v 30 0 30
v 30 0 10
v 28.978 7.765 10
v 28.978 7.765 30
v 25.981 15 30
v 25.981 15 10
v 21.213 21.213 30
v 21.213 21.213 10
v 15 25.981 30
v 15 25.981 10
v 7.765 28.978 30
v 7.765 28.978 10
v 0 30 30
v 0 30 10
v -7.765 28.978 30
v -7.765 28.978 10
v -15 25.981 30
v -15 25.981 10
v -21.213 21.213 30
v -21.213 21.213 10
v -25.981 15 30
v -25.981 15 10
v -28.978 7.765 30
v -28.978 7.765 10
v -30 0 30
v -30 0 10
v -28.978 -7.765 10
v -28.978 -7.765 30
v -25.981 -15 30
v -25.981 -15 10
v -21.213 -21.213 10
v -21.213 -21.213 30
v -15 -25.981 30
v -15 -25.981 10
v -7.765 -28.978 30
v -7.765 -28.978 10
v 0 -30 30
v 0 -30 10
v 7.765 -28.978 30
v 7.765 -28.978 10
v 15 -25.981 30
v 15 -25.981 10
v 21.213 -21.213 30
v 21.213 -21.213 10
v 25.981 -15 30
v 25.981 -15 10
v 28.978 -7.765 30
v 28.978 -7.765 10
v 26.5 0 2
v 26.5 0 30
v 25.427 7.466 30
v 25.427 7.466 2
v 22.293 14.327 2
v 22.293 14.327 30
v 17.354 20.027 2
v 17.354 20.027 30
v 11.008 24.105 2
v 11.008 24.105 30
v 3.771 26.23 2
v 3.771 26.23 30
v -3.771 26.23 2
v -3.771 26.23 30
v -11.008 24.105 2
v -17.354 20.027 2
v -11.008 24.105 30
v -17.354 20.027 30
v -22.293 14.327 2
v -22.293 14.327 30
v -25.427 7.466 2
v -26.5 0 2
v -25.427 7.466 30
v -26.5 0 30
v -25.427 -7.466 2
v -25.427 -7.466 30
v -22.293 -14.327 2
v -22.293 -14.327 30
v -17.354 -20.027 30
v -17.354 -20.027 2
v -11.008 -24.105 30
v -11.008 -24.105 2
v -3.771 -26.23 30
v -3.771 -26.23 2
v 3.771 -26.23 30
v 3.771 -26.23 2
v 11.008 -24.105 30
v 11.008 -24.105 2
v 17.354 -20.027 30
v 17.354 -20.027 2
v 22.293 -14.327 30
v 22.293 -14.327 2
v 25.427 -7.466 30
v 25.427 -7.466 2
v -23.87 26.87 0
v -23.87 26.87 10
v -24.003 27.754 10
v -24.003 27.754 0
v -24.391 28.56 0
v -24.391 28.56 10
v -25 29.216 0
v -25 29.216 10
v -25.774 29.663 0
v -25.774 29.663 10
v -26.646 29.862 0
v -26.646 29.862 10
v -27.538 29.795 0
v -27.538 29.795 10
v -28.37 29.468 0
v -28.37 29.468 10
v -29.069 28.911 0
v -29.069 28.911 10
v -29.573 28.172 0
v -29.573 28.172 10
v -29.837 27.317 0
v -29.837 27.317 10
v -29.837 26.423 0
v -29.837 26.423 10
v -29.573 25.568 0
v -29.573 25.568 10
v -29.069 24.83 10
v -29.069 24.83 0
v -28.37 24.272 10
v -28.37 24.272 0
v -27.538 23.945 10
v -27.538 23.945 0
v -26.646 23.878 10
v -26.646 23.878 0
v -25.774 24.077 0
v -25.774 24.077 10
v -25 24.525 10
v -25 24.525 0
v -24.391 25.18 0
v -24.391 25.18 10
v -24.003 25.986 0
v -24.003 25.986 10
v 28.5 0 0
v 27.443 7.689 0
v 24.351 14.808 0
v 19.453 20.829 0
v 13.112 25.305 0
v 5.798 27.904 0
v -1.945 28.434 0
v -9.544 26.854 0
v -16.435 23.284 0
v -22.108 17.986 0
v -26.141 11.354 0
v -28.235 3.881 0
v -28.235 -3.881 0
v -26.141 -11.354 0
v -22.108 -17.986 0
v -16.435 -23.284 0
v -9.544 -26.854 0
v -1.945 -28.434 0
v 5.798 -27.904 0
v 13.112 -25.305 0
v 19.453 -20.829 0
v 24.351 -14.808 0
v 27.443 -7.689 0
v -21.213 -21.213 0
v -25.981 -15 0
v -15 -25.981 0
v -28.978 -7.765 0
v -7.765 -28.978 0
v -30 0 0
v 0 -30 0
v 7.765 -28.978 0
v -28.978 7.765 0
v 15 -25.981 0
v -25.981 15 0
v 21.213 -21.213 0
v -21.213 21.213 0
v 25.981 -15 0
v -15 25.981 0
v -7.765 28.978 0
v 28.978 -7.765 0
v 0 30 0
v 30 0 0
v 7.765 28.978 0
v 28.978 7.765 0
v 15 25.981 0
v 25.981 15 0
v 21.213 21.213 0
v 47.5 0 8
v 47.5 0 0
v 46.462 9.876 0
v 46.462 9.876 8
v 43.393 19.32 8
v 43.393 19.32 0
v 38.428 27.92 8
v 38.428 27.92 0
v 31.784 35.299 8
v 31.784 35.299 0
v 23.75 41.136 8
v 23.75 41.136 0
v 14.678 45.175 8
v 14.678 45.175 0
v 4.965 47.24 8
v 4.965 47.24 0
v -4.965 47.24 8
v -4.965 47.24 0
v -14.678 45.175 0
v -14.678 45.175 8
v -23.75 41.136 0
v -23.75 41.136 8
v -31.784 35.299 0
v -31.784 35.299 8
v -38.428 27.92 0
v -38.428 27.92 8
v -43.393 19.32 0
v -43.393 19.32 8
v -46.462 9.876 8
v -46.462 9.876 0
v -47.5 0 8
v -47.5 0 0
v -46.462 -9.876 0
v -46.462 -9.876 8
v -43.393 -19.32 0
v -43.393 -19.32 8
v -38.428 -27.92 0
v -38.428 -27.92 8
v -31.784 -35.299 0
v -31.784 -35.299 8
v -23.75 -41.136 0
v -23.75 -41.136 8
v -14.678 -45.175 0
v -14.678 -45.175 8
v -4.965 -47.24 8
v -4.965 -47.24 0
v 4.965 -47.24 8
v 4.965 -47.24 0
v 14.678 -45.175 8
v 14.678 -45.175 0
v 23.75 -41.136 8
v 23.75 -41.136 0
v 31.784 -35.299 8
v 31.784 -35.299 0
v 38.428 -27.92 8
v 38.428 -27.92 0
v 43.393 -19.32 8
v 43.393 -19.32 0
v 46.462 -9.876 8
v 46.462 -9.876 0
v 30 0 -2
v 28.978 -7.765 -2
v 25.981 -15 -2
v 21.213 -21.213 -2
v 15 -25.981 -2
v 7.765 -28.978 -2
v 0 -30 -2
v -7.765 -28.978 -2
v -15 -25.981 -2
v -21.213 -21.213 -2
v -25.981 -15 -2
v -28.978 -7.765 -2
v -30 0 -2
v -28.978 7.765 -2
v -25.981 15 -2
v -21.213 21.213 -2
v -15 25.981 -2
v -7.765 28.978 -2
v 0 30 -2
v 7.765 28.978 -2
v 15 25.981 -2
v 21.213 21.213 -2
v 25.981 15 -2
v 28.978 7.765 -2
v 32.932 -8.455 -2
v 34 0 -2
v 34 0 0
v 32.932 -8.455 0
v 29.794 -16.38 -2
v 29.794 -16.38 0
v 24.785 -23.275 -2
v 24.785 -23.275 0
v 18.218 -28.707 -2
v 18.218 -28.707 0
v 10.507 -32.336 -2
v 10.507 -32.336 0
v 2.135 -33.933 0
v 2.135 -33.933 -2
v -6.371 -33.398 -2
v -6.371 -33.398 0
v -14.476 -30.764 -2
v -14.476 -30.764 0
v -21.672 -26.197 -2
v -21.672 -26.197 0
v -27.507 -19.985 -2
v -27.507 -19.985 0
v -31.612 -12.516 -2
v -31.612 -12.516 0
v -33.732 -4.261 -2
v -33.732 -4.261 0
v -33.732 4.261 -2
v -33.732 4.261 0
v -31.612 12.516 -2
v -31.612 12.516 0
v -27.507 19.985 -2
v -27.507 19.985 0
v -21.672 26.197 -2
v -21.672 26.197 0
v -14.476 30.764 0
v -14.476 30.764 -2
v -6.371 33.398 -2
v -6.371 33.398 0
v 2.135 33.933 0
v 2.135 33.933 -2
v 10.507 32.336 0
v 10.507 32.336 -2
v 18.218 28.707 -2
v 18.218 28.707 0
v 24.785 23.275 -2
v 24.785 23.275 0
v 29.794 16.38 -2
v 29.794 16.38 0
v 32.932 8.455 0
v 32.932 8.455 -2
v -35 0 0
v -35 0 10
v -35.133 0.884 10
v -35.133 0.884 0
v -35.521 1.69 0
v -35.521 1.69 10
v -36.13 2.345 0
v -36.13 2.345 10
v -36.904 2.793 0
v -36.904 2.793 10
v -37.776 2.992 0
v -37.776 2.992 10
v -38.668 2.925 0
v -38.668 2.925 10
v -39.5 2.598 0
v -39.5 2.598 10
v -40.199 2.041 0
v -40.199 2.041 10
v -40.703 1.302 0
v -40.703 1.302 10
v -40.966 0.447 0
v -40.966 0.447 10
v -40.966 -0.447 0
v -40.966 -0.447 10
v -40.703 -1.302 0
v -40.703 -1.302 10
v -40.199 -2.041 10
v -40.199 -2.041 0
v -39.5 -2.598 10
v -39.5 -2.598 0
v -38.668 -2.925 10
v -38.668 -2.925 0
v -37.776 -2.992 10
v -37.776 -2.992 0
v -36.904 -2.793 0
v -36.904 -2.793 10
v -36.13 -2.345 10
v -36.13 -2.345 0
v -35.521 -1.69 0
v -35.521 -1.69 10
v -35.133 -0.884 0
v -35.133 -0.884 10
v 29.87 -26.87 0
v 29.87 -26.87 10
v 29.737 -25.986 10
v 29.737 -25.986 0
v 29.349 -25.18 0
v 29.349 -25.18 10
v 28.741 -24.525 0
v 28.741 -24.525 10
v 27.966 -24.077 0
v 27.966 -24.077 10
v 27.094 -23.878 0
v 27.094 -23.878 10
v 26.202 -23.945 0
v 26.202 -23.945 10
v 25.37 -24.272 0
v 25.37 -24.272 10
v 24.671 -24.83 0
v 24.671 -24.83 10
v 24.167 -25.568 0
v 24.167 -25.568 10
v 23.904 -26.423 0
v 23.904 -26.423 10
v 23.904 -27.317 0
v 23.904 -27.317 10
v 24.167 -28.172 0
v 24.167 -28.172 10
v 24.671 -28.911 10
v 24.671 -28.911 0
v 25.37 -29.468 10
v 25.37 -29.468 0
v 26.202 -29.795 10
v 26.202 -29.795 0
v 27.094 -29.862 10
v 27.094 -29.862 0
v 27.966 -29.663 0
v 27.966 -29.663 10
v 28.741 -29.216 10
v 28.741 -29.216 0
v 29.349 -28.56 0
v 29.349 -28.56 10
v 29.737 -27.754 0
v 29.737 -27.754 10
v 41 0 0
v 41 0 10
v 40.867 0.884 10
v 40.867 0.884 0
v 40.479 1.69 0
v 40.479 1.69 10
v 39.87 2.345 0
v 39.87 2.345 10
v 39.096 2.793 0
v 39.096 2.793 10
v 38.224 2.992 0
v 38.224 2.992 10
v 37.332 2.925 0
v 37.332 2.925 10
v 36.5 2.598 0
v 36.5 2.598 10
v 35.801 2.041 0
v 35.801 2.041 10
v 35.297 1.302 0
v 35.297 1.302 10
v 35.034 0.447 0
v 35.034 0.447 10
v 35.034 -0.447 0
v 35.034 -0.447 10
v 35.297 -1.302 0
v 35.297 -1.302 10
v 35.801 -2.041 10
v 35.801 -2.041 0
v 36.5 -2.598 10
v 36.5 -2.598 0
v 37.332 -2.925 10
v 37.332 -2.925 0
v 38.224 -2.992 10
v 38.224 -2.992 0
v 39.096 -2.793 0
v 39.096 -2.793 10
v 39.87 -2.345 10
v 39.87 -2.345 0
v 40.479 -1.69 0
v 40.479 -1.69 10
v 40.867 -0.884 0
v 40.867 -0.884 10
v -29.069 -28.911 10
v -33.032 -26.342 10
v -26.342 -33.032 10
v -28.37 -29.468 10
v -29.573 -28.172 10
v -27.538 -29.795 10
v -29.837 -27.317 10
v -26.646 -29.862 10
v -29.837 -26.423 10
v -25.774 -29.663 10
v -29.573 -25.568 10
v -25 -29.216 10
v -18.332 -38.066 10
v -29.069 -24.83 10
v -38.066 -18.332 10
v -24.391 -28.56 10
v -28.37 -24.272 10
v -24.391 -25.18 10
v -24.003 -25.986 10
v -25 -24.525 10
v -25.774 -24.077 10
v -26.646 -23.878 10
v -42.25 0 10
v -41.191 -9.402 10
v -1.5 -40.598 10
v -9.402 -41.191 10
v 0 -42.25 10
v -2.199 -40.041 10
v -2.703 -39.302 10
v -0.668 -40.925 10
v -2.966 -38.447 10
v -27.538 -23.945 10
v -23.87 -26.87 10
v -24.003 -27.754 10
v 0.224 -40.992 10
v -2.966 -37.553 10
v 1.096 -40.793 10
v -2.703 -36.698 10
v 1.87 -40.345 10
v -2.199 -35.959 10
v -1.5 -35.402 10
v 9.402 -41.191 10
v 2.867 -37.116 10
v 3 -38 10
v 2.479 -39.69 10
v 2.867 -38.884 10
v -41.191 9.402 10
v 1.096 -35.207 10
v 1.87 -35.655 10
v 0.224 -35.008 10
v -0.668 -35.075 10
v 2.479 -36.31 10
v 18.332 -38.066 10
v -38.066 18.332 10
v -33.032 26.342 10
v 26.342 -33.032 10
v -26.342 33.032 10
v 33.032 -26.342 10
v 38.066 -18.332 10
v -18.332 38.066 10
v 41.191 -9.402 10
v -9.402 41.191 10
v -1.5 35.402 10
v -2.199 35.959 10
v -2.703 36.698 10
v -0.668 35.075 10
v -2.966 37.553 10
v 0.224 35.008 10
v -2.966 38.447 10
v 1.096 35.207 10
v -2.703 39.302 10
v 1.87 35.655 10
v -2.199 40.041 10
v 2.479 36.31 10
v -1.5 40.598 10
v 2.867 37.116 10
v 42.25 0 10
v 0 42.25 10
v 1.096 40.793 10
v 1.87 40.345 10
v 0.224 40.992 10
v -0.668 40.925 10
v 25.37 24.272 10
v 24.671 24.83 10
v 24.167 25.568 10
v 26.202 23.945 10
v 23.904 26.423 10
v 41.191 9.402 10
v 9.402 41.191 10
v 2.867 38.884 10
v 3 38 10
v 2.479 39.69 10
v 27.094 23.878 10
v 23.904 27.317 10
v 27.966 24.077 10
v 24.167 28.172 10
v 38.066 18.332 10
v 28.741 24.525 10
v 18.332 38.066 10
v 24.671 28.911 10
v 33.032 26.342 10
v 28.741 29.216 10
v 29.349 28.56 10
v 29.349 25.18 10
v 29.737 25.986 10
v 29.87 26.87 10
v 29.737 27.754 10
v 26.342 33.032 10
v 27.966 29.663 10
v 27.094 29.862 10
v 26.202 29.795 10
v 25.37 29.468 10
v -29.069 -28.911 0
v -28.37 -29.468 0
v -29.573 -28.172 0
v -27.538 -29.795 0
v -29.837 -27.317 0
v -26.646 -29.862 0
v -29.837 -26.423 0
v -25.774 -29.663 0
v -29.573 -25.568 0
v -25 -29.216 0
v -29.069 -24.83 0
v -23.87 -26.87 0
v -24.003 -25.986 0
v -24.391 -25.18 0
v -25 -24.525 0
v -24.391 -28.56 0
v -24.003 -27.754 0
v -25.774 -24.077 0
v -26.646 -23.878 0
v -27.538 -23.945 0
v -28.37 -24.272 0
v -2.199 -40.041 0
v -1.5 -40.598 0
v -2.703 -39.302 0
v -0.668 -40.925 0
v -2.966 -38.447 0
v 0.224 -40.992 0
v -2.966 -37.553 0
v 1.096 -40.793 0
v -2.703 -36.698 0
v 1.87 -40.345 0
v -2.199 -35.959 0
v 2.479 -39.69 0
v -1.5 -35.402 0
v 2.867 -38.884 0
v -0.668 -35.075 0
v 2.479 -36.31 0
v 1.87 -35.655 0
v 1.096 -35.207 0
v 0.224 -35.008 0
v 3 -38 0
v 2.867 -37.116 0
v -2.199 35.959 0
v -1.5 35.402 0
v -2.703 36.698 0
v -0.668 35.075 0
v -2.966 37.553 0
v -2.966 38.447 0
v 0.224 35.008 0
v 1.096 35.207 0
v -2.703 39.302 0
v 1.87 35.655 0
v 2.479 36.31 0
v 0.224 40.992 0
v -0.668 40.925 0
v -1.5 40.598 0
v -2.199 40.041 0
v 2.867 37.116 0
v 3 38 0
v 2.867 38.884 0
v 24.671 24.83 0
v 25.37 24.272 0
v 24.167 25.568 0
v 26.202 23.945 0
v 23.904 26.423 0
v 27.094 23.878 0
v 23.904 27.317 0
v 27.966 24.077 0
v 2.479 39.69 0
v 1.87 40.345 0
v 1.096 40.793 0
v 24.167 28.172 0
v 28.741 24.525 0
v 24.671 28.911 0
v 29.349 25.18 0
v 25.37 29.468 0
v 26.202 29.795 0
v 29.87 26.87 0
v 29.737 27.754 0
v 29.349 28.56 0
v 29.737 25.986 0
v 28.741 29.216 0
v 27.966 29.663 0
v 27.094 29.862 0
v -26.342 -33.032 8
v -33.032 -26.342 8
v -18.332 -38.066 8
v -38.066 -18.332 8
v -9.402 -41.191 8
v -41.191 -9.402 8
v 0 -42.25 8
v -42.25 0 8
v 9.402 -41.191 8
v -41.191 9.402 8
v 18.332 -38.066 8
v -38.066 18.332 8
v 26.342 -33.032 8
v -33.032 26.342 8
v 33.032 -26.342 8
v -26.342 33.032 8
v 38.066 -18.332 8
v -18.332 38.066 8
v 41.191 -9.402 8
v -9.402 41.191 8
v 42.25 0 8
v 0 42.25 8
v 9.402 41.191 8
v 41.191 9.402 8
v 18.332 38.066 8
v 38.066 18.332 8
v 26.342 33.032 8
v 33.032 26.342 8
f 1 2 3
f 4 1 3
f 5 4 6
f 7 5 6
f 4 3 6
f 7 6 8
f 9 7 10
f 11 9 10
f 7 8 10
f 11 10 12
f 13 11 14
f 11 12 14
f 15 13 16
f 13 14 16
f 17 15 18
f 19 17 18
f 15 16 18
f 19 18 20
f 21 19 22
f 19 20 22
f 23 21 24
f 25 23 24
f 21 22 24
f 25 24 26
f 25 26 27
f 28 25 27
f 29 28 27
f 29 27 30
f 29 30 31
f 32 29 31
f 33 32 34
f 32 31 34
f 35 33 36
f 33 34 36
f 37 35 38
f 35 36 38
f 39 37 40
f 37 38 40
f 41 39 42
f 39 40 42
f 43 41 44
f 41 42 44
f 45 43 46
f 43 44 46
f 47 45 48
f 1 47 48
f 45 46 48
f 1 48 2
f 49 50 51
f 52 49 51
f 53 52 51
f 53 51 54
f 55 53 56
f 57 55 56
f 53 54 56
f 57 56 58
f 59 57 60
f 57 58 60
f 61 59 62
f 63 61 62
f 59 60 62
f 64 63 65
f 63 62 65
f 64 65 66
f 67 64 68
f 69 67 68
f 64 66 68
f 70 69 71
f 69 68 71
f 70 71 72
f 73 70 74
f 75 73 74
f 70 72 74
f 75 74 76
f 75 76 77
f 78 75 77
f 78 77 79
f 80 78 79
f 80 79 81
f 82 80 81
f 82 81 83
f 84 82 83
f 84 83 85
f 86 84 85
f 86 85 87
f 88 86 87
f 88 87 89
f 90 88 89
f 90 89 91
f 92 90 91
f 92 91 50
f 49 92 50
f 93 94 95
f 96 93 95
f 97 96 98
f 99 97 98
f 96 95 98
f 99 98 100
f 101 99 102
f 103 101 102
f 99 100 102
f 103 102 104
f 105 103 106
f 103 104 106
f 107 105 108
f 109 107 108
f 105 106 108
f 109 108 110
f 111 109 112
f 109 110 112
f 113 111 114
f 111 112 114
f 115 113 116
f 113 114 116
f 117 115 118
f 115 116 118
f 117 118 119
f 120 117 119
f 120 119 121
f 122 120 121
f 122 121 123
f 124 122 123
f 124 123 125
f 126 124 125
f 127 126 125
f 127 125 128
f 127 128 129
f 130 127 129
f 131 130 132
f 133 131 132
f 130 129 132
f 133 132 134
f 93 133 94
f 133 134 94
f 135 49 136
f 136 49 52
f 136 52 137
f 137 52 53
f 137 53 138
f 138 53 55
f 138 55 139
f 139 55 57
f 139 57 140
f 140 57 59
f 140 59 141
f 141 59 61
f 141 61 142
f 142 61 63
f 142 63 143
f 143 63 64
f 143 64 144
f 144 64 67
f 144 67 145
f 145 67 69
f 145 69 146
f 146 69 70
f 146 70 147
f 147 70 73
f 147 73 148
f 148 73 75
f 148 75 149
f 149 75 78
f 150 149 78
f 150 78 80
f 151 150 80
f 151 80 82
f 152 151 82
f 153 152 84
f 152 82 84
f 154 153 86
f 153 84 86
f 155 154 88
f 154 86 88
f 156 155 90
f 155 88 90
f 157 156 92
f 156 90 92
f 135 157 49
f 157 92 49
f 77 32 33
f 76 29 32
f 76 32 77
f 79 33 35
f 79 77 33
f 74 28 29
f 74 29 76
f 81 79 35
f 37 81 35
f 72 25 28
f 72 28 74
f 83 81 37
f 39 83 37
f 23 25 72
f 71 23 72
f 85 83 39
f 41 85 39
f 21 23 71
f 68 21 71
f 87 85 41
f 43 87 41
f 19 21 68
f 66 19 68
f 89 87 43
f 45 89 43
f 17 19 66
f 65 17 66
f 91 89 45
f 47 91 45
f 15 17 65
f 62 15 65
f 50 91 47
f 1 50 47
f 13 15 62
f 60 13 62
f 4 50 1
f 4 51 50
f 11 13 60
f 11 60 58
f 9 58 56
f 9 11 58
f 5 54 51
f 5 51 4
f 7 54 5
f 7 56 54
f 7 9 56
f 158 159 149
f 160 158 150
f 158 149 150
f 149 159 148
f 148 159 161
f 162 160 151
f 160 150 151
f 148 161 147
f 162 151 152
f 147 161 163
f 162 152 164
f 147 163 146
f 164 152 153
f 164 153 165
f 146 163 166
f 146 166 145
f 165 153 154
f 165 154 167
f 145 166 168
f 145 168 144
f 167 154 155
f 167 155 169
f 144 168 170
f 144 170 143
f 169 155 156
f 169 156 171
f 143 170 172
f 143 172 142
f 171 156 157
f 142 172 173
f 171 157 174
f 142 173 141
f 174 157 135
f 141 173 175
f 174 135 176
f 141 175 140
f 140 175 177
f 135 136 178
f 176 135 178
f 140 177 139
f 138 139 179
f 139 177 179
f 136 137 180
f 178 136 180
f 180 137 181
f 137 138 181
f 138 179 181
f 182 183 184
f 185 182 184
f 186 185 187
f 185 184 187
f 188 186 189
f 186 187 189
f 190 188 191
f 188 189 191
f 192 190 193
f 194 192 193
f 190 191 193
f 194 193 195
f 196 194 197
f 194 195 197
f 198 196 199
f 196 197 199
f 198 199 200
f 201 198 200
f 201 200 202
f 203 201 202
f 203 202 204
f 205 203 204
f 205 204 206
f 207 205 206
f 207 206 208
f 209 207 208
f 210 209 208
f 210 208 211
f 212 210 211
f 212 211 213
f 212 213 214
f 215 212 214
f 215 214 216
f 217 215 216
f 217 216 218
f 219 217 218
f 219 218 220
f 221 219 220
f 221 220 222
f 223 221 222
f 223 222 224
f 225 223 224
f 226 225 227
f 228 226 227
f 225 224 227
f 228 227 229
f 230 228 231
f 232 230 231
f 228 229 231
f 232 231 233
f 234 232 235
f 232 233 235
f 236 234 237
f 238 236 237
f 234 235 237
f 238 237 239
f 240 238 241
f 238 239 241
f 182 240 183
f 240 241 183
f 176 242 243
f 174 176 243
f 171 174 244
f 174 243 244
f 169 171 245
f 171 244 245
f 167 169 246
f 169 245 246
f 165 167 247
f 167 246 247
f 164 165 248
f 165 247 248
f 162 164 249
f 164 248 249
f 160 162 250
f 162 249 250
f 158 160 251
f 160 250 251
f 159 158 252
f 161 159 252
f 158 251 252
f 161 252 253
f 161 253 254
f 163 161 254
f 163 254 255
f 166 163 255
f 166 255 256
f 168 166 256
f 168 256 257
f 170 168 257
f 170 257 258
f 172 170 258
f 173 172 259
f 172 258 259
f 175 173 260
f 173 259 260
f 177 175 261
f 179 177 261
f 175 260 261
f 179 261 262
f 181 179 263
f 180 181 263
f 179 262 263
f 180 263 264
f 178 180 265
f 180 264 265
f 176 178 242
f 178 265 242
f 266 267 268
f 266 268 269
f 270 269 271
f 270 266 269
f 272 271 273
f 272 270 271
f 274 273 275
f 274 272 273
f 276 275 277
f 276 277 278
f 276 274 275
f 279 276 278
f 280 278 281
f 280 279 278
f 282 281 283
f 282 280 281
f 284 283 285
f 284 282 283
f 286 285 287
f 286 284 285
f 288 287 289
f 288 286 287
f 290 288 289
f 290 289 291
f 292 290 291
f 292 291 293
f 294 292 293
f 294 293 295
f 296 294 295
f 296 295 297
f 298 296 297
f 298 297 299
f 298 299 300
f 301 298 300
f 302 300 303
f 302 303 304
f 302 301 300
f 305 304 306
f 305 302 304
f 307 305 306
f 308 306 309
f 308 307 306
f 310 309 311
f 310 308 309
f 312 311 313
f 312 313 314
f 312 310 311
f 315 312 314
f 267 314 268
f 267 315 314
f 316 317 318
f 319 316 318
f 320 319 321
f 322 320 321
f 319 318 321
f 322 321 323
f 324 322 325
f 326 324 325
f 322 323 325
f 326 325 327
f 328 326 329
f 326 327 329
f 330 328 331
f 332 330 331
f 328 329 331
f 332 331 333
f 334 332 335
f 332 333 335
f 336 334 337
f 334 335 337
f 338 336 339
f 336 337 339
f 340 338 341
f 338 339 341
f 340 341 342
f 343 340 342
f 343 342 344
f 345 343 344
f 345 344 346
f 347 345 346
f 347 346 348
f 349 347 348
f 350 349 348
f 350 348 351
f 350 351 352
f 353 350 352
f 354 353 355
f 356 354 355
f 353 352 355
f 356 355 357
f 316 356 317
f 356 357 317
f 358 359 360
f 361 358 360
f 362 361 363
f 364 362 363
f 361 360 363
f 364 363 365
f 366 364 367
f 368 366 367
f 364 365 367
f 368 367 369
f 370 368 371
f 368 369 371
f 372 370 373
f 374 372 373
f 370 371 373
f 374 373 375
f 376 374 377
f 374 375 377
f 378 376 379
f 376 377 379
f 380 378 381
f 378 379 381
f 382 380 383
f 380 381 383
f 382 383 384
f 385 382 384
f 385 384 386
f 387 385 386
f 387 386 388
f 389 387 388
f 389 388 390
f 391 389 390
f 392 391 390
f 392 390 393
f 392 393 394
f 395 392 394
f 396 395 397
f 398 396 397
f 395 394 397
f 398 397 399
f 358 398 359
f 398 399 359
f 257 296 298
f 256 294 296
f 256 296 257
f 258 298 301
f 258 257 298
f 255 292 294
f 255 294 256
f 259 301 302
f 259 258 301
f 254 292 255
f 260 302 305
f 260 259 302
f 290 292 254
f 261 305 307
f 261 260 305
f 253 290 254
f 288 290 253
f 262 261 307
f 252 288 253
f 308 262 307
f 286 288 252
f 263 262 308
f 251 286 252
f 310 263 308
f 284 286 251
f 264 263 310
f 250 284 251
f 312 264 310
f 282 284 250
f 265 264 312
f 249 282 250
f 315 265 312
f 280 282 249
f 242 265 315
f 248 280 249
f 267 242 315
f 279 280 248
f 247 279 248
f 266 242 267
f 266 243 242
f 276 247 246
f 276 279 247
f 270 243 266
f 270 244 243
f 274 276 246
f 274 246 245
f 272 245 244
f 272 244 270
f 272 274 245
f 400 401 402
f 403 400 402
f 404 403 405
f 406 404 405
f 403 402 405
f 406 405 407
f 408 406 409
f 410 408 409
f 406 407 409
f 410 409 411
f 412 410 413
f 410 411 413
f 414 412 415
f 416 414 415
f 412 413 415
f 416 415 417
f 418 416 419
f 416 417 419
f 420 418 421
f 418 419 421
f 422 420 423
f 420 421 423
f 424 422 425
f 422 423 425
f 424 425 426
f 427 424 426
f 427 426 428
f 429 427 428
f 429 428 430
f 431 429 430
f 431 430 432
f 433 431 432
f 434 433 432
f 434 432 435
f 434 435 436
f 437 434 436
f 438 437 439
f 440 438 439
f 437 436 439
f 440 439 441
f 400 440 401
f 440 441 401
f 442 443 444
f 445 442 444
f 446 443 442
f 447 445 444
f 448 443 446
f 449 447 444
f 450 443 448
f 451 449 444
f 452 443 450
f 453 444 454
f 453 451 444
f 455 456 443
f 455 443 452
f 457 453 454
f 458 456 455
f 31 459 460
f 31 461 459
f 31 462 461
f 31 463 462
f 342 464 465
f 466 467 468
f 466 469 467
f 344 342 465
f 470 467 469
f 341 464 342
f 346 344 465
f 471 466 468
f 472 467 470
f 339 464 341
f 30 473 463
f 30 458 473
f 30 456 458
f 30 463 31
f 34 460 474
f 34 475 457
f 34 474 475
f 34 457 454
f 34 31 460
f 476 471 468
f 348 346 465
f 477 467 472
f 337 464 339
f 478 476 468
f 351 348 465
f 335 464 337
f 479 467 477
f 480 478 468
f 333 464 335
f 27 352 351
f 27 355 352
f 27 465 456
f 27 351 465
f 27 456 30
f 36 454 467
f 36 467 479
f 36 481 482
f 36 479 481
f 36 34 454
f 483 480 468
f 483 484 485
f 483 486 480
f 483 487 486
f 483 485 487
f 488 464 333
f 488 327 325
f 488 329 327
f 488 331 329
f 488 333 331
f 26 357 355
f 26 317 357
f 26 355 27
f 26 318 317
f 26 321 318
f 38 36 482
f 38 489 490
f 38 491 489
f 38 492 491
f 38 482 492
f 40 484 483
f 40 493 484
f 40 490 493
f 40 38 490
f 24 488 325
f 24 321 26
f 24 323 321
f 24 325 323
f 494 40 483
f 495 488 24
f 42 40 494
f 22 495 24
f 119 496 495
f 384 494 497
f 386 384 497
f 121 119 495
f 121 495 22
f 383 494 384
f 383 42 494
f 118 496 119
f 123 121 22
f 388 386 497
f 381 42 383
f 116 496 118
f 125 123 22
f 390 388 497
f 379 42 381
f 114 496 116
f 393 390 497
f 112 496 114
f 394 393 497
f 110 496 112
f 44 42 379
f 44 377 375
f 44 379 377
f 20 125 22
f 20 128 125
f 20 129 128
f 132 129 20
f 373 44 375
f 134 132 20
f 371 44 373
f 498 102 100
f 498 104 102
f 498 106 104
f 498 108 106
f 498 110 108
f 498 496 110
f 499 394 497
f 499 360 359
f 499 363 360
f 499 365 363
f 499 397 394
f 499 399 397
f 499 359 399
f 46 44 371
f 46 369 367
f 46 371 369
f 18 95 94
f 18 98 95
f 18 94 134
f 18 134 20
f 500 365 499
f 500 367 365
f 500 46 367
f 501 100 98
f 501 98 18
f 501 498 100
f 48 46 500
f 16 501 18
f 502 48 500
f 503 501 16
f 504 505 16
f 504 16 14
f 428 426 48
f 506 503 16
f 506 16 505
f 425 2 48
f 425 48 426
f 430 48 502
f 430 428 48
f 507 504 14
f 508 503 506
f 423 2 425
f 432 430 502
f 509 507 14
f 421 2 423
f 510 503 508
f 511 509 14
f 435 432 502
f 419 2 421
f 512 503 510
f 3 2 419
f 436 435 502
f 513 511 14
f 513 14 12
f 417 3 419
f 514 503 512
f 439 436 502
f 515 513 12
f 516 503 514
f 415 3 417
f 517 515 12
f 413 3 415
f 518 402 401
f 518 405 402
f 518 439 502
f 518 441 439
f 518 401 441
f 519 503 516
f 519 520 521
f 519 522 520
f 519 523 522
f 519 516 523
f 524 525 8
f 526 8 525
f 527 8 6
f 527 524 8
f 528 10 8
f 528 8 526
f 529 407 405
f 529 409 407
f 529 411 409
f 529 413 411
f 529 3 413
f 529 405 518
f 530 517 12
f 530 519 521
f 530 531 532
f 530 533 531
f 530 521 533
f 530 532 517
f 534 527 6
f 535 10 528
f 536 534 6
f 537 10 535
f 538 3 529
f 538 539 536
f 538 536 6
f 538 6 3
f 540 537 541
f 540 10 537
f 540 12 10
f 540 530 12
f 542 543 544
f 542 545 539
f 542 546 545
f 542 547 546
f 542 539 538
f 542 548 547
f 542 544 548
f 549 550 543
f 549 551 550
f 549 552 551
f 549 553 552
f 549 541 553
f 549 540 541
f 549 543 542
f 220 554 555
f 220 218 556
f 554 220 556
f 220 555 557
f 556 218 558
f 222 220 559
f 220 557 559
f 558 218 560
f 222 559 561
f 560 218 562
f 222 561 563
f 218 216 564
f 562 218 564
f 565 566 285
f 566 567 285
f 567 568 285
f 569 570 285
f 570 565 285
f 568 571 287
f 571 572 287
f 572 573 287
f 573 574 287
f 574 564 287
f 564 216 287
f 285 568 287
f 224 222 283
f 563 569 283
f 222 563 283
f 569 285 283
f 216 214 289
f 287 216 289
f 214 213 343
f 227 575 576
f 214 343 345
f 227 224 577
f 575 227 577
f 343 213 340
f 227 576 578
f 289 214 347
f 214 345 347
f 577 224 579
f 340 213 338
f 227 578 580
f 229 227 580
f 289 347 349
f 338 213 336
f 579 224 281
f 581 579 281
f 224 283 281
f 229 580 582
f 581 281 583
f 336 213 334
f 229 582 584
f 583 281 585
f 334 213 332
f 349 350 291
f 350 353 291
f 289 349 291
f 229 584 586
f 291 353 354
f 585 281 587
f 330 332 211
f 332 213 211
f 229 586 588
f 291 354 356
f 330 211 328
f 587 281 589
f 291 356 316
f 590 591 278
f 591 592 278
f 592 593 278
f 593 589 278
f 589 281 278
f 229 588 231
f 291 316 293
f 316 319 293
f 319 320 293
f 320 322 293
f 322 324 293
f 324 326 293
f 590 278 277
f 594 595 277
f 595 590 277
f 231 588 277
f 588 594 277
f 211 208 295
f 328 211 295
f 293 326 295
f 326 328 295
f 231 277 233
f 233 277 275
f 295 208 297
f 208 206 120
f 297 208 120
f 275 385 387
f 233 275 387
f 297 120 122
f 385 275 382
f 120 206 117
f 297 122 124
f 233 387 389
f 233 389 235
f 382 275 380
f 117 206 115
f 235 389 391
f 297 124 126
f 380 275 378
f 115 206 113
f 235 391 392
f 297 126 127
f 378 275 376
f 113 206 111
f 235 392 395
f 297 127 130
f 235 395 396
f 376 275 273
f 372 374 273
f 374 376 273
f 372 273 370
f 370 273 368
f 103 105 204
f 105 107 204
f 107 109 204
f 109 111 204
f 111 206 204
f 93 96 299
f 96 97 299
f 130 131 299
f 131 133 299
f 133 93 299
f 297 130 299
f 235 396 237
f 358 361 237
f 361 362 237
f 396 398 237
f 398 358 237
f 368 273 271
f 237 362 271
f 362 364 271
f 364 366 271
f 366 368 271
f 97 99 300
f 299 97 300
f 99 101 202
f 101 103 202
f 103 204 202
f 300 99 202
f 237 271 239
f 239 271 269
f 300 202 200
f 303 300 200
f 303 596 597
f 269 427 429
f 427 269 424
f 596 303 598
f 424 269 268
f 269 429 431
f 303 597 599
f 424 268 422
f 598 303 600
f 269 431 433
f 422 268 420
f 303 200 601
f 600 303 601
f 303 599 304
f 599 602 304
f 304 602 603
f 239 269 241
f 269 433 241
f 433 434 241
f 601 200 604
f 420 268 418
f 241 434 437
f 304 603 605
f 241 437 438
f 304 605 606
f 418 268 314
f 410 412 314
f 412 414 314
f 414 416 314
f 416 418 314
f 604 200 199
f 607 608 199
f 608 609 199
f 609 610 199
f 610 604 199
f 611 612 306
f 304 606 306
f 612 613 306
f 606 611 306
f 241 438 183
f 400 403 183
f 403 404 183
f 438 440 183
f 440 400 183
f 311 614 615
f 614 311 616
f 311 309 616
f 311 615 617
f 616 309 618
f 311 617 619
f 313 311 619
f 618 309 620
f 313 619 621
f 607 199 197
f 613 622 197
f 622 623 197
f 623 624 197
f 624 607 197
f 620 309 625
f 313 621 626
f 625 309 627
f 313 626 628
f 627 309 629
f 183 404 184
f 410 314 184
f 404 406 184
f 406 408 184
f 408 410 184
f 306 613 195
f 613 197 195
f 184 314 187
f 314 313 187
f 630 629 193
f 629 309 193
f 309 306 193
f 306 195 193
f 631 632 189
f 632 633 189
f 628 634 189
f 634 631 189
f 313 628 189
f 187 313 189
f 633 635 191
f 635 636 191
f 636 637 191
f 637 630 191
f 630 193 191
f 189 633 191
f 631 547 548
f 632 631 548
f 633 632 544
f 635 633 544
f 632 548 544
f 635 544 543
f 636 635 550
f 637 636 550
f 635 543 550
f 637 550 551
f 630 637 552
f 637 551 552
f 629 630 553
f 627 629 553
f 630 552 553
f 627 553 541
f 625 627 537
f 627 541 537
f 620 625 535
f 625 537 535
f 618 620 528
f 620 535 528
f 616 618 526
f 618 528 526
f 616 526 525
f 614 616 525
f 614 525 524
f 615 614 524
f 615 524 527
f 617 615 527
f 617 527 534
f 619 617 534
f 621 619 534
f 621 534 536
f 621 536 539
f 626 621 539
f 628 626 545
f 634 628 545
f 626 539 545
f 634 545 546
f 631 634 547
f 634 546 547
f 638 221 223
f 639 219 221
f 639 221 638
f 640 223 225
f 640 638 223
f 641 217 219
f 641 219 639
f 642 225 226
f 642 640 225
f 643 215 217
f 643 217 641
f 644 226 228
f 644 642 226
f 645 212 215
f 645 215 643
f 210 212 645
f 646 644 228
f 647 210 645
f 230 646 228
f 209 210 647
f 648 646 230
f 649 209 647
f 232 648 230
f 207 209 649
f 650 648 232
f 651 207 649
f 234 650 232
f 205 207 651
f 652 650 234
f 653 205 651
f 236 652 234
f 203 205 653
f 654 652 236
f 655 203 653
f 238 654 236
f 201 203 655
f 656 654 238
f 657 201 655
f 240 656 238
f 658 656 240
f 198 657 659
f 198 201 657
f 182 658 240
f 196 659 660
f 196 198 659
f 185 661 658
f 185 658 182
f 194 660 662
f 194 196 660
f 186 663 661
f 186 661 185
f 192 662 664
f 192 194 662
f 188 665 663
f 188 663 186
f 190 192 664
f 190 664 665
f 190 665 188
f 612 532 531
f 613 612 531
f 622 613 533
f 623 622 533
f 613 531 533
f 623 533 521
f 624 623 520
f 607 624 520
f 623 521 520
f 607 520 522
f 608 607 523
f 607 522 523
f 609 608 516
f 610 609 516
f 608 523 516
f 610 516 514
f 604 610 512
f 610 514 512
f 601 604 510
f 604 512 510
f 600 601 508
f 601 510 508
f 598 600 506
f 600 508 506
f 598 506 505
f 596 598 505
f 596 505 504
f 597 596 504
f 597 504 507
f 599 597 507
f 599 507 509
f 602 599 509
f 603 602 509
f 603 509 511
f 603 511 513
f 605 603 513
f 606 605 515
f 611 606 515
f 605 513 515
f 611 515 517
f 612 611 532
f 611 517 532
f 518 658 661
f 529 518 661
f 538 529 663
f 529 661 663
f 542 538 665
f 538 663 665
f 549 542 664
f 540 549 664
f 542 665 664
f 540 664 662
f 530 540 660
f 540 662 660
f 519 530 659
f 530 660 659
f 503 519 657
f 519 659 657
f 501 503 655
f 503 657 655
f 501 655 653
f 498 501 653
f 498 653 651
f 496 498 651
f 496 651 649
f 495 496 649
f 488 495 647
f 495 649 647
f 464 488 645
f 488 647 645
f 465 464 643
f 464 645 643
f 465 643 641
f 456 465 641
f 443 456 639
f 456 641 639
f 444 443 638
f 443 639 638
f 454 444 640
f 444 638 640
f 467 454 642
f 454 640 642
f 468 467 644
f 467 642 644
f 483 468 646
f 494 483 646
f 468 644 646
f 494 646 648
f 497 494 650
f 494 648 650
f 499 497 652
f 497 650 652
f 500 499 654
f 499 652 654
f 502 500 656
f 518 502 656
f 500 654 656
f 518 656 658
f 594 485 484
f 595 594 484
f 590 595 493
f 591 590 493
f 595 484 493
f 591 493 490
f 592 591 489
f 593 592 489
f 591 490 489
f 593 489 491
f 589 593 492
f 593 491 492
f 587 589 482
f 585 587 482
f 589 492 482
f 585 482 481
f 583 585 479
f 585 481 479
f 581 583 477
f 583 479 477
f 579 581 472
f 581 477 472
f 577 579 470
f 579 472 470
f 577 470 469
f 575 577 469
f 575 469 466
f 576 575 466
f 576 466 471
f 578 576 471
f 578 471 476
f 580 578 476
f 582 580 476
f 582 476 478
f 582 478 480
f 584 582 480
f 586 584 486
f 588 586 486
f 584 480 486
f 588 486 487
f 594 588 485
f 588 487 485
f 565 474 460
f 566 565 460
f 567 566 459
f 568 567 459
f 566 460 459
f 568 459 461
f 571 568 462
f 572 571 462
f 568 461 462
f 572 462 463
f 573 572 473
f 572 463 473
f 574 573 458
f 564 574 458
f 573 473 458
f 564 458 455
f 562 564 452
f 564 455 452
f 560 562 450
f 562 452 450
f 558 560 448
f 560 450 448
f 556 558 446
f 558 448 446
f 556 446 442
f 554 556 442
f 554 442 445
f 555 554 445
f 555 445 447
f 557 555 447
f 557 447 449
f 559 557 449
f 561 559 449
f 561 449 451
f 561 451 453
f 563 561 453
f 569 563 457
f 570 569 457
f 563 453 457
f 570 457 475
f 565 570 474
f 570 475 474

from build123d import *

# Parameters (mm, degrees)
SKETCH_1_R          = 47.5
EXTRUDE_1_DEPTH     = 10
SKETCH_2_R          = 30
EXTRUDE_2_DEPTH     = 20
SKETCH_3_R          = 26.5
CUT_EXTRUDE_1_DEPTH = 40
EXTRUDE_START       = 2
SKETCH_4_R          = 34
SKETCH_4_R_2        = 30
EXTRUDE_3_DEPTH     = 2
CUT_EXTRUDE_START   = -2
SKETCH_5_R          = 47.5
SKETCH_5_R_2        = 42.25
CUT_EXTRUDE_2_DEPTH = 2
SKETCH_6_R          = 3
CUT_EXTRUDE_3_DEPTH = 10
CHAMFER_1_SIZE      = 2


with BuildPart() as part:
    # 草图1 → 拉伸1 (new body)
    with BuildSketch(Plane.XY):
        Circle(SKETCH_1_R)
    extrude(amount=EXTRUDE_1_DEPTH)

    # 草图2 → 拉伸2 (add)
    with BuildSketch(Plane.XY.offset(10)):
        Circle(SKETCH_2_R)
    extrude(amount=EXTRUDE_2_DEPTH)

    # 草图3 → 切除-拉伸1 (cut)
    with BuildSketch(Plane.XY.offset(30)):
        Circle(SKETCH_3_R)
    extrude(amount=-CUT_EXTRUDE_1_DEPTH, mode=Mode.SUBTRACT)

    # 草图4 → 拉伸3 (add)
    with BuildSketch(Plane(origin=(0, 0, 0), x_dir=(-1, 0, 0), z_dir=(0, 0, -1)).offset(EXTRUDE_START)):
        with Locations(Location((0, 0, 0), (0, 0, 180))):
            Circle(SKETCH_4_R)
        with Locations(Location((0, 0, 0), (0, 0, 180))):
            Circle(SKETCH_4_R_2, mode=Mode.SUBTRACT)
    extrude(amount=-EXTRUDE_3_DEPTH)

    # 草图5 → 切除-拉伸2 (cut)
    with BuildSketch(Plane.XY.offset(10).offset(CUT_EXTRUDE_START)):
        Circle(SKETCH_5_R)
        Circle(SKETCH_5_R_2, mode=Mode.SUBTRACT)
    extrude(amount=CUT_EXTRUDE_2_DEPTH, mode=Mode.SUBTRACT)

    # 草图6 → 切除-拉伸3 (cut)
    with BuildSketch(Plane.XY.offset(10)):
        with Locations((26.870057685, 26.870057685)):
            Circle(SKETCH_6_R)
        with Locations((0, 38)):
            Circle(SKETCH_6_R)
        with Locations((38, 0)):
            Circle(SKETCH_6_R)
        with Locations((26.870057685, -26.870057685)):
            Circle(SKETCH_6_R)
        with Locations((0, -38)):
            Circle(SKETCH_6_R)
        with Locations((-26.870057685, -26.870057685)):
            Circle(SKETCH_6_R)
        with Locations((-38, 0)):
            Circle(SKETCH_6_R)
        with Locations((-26.870057685, 26.870057685)):
            Circle(SKETCH_6_R)
    extrude(amount=-CUT_EXTRUDE_3_DEPTH, mode=Mode.SUBTRACT)

    # 倒角1
    chamfer_1_edges = [part.edges().sort_by_distance(p)[0] for p in [
        (-26.5, 0, 0),
    ]]
    chamfer(chamfer_1_edges, length=CHAMFER_1_SIZE)


solid = part.part
